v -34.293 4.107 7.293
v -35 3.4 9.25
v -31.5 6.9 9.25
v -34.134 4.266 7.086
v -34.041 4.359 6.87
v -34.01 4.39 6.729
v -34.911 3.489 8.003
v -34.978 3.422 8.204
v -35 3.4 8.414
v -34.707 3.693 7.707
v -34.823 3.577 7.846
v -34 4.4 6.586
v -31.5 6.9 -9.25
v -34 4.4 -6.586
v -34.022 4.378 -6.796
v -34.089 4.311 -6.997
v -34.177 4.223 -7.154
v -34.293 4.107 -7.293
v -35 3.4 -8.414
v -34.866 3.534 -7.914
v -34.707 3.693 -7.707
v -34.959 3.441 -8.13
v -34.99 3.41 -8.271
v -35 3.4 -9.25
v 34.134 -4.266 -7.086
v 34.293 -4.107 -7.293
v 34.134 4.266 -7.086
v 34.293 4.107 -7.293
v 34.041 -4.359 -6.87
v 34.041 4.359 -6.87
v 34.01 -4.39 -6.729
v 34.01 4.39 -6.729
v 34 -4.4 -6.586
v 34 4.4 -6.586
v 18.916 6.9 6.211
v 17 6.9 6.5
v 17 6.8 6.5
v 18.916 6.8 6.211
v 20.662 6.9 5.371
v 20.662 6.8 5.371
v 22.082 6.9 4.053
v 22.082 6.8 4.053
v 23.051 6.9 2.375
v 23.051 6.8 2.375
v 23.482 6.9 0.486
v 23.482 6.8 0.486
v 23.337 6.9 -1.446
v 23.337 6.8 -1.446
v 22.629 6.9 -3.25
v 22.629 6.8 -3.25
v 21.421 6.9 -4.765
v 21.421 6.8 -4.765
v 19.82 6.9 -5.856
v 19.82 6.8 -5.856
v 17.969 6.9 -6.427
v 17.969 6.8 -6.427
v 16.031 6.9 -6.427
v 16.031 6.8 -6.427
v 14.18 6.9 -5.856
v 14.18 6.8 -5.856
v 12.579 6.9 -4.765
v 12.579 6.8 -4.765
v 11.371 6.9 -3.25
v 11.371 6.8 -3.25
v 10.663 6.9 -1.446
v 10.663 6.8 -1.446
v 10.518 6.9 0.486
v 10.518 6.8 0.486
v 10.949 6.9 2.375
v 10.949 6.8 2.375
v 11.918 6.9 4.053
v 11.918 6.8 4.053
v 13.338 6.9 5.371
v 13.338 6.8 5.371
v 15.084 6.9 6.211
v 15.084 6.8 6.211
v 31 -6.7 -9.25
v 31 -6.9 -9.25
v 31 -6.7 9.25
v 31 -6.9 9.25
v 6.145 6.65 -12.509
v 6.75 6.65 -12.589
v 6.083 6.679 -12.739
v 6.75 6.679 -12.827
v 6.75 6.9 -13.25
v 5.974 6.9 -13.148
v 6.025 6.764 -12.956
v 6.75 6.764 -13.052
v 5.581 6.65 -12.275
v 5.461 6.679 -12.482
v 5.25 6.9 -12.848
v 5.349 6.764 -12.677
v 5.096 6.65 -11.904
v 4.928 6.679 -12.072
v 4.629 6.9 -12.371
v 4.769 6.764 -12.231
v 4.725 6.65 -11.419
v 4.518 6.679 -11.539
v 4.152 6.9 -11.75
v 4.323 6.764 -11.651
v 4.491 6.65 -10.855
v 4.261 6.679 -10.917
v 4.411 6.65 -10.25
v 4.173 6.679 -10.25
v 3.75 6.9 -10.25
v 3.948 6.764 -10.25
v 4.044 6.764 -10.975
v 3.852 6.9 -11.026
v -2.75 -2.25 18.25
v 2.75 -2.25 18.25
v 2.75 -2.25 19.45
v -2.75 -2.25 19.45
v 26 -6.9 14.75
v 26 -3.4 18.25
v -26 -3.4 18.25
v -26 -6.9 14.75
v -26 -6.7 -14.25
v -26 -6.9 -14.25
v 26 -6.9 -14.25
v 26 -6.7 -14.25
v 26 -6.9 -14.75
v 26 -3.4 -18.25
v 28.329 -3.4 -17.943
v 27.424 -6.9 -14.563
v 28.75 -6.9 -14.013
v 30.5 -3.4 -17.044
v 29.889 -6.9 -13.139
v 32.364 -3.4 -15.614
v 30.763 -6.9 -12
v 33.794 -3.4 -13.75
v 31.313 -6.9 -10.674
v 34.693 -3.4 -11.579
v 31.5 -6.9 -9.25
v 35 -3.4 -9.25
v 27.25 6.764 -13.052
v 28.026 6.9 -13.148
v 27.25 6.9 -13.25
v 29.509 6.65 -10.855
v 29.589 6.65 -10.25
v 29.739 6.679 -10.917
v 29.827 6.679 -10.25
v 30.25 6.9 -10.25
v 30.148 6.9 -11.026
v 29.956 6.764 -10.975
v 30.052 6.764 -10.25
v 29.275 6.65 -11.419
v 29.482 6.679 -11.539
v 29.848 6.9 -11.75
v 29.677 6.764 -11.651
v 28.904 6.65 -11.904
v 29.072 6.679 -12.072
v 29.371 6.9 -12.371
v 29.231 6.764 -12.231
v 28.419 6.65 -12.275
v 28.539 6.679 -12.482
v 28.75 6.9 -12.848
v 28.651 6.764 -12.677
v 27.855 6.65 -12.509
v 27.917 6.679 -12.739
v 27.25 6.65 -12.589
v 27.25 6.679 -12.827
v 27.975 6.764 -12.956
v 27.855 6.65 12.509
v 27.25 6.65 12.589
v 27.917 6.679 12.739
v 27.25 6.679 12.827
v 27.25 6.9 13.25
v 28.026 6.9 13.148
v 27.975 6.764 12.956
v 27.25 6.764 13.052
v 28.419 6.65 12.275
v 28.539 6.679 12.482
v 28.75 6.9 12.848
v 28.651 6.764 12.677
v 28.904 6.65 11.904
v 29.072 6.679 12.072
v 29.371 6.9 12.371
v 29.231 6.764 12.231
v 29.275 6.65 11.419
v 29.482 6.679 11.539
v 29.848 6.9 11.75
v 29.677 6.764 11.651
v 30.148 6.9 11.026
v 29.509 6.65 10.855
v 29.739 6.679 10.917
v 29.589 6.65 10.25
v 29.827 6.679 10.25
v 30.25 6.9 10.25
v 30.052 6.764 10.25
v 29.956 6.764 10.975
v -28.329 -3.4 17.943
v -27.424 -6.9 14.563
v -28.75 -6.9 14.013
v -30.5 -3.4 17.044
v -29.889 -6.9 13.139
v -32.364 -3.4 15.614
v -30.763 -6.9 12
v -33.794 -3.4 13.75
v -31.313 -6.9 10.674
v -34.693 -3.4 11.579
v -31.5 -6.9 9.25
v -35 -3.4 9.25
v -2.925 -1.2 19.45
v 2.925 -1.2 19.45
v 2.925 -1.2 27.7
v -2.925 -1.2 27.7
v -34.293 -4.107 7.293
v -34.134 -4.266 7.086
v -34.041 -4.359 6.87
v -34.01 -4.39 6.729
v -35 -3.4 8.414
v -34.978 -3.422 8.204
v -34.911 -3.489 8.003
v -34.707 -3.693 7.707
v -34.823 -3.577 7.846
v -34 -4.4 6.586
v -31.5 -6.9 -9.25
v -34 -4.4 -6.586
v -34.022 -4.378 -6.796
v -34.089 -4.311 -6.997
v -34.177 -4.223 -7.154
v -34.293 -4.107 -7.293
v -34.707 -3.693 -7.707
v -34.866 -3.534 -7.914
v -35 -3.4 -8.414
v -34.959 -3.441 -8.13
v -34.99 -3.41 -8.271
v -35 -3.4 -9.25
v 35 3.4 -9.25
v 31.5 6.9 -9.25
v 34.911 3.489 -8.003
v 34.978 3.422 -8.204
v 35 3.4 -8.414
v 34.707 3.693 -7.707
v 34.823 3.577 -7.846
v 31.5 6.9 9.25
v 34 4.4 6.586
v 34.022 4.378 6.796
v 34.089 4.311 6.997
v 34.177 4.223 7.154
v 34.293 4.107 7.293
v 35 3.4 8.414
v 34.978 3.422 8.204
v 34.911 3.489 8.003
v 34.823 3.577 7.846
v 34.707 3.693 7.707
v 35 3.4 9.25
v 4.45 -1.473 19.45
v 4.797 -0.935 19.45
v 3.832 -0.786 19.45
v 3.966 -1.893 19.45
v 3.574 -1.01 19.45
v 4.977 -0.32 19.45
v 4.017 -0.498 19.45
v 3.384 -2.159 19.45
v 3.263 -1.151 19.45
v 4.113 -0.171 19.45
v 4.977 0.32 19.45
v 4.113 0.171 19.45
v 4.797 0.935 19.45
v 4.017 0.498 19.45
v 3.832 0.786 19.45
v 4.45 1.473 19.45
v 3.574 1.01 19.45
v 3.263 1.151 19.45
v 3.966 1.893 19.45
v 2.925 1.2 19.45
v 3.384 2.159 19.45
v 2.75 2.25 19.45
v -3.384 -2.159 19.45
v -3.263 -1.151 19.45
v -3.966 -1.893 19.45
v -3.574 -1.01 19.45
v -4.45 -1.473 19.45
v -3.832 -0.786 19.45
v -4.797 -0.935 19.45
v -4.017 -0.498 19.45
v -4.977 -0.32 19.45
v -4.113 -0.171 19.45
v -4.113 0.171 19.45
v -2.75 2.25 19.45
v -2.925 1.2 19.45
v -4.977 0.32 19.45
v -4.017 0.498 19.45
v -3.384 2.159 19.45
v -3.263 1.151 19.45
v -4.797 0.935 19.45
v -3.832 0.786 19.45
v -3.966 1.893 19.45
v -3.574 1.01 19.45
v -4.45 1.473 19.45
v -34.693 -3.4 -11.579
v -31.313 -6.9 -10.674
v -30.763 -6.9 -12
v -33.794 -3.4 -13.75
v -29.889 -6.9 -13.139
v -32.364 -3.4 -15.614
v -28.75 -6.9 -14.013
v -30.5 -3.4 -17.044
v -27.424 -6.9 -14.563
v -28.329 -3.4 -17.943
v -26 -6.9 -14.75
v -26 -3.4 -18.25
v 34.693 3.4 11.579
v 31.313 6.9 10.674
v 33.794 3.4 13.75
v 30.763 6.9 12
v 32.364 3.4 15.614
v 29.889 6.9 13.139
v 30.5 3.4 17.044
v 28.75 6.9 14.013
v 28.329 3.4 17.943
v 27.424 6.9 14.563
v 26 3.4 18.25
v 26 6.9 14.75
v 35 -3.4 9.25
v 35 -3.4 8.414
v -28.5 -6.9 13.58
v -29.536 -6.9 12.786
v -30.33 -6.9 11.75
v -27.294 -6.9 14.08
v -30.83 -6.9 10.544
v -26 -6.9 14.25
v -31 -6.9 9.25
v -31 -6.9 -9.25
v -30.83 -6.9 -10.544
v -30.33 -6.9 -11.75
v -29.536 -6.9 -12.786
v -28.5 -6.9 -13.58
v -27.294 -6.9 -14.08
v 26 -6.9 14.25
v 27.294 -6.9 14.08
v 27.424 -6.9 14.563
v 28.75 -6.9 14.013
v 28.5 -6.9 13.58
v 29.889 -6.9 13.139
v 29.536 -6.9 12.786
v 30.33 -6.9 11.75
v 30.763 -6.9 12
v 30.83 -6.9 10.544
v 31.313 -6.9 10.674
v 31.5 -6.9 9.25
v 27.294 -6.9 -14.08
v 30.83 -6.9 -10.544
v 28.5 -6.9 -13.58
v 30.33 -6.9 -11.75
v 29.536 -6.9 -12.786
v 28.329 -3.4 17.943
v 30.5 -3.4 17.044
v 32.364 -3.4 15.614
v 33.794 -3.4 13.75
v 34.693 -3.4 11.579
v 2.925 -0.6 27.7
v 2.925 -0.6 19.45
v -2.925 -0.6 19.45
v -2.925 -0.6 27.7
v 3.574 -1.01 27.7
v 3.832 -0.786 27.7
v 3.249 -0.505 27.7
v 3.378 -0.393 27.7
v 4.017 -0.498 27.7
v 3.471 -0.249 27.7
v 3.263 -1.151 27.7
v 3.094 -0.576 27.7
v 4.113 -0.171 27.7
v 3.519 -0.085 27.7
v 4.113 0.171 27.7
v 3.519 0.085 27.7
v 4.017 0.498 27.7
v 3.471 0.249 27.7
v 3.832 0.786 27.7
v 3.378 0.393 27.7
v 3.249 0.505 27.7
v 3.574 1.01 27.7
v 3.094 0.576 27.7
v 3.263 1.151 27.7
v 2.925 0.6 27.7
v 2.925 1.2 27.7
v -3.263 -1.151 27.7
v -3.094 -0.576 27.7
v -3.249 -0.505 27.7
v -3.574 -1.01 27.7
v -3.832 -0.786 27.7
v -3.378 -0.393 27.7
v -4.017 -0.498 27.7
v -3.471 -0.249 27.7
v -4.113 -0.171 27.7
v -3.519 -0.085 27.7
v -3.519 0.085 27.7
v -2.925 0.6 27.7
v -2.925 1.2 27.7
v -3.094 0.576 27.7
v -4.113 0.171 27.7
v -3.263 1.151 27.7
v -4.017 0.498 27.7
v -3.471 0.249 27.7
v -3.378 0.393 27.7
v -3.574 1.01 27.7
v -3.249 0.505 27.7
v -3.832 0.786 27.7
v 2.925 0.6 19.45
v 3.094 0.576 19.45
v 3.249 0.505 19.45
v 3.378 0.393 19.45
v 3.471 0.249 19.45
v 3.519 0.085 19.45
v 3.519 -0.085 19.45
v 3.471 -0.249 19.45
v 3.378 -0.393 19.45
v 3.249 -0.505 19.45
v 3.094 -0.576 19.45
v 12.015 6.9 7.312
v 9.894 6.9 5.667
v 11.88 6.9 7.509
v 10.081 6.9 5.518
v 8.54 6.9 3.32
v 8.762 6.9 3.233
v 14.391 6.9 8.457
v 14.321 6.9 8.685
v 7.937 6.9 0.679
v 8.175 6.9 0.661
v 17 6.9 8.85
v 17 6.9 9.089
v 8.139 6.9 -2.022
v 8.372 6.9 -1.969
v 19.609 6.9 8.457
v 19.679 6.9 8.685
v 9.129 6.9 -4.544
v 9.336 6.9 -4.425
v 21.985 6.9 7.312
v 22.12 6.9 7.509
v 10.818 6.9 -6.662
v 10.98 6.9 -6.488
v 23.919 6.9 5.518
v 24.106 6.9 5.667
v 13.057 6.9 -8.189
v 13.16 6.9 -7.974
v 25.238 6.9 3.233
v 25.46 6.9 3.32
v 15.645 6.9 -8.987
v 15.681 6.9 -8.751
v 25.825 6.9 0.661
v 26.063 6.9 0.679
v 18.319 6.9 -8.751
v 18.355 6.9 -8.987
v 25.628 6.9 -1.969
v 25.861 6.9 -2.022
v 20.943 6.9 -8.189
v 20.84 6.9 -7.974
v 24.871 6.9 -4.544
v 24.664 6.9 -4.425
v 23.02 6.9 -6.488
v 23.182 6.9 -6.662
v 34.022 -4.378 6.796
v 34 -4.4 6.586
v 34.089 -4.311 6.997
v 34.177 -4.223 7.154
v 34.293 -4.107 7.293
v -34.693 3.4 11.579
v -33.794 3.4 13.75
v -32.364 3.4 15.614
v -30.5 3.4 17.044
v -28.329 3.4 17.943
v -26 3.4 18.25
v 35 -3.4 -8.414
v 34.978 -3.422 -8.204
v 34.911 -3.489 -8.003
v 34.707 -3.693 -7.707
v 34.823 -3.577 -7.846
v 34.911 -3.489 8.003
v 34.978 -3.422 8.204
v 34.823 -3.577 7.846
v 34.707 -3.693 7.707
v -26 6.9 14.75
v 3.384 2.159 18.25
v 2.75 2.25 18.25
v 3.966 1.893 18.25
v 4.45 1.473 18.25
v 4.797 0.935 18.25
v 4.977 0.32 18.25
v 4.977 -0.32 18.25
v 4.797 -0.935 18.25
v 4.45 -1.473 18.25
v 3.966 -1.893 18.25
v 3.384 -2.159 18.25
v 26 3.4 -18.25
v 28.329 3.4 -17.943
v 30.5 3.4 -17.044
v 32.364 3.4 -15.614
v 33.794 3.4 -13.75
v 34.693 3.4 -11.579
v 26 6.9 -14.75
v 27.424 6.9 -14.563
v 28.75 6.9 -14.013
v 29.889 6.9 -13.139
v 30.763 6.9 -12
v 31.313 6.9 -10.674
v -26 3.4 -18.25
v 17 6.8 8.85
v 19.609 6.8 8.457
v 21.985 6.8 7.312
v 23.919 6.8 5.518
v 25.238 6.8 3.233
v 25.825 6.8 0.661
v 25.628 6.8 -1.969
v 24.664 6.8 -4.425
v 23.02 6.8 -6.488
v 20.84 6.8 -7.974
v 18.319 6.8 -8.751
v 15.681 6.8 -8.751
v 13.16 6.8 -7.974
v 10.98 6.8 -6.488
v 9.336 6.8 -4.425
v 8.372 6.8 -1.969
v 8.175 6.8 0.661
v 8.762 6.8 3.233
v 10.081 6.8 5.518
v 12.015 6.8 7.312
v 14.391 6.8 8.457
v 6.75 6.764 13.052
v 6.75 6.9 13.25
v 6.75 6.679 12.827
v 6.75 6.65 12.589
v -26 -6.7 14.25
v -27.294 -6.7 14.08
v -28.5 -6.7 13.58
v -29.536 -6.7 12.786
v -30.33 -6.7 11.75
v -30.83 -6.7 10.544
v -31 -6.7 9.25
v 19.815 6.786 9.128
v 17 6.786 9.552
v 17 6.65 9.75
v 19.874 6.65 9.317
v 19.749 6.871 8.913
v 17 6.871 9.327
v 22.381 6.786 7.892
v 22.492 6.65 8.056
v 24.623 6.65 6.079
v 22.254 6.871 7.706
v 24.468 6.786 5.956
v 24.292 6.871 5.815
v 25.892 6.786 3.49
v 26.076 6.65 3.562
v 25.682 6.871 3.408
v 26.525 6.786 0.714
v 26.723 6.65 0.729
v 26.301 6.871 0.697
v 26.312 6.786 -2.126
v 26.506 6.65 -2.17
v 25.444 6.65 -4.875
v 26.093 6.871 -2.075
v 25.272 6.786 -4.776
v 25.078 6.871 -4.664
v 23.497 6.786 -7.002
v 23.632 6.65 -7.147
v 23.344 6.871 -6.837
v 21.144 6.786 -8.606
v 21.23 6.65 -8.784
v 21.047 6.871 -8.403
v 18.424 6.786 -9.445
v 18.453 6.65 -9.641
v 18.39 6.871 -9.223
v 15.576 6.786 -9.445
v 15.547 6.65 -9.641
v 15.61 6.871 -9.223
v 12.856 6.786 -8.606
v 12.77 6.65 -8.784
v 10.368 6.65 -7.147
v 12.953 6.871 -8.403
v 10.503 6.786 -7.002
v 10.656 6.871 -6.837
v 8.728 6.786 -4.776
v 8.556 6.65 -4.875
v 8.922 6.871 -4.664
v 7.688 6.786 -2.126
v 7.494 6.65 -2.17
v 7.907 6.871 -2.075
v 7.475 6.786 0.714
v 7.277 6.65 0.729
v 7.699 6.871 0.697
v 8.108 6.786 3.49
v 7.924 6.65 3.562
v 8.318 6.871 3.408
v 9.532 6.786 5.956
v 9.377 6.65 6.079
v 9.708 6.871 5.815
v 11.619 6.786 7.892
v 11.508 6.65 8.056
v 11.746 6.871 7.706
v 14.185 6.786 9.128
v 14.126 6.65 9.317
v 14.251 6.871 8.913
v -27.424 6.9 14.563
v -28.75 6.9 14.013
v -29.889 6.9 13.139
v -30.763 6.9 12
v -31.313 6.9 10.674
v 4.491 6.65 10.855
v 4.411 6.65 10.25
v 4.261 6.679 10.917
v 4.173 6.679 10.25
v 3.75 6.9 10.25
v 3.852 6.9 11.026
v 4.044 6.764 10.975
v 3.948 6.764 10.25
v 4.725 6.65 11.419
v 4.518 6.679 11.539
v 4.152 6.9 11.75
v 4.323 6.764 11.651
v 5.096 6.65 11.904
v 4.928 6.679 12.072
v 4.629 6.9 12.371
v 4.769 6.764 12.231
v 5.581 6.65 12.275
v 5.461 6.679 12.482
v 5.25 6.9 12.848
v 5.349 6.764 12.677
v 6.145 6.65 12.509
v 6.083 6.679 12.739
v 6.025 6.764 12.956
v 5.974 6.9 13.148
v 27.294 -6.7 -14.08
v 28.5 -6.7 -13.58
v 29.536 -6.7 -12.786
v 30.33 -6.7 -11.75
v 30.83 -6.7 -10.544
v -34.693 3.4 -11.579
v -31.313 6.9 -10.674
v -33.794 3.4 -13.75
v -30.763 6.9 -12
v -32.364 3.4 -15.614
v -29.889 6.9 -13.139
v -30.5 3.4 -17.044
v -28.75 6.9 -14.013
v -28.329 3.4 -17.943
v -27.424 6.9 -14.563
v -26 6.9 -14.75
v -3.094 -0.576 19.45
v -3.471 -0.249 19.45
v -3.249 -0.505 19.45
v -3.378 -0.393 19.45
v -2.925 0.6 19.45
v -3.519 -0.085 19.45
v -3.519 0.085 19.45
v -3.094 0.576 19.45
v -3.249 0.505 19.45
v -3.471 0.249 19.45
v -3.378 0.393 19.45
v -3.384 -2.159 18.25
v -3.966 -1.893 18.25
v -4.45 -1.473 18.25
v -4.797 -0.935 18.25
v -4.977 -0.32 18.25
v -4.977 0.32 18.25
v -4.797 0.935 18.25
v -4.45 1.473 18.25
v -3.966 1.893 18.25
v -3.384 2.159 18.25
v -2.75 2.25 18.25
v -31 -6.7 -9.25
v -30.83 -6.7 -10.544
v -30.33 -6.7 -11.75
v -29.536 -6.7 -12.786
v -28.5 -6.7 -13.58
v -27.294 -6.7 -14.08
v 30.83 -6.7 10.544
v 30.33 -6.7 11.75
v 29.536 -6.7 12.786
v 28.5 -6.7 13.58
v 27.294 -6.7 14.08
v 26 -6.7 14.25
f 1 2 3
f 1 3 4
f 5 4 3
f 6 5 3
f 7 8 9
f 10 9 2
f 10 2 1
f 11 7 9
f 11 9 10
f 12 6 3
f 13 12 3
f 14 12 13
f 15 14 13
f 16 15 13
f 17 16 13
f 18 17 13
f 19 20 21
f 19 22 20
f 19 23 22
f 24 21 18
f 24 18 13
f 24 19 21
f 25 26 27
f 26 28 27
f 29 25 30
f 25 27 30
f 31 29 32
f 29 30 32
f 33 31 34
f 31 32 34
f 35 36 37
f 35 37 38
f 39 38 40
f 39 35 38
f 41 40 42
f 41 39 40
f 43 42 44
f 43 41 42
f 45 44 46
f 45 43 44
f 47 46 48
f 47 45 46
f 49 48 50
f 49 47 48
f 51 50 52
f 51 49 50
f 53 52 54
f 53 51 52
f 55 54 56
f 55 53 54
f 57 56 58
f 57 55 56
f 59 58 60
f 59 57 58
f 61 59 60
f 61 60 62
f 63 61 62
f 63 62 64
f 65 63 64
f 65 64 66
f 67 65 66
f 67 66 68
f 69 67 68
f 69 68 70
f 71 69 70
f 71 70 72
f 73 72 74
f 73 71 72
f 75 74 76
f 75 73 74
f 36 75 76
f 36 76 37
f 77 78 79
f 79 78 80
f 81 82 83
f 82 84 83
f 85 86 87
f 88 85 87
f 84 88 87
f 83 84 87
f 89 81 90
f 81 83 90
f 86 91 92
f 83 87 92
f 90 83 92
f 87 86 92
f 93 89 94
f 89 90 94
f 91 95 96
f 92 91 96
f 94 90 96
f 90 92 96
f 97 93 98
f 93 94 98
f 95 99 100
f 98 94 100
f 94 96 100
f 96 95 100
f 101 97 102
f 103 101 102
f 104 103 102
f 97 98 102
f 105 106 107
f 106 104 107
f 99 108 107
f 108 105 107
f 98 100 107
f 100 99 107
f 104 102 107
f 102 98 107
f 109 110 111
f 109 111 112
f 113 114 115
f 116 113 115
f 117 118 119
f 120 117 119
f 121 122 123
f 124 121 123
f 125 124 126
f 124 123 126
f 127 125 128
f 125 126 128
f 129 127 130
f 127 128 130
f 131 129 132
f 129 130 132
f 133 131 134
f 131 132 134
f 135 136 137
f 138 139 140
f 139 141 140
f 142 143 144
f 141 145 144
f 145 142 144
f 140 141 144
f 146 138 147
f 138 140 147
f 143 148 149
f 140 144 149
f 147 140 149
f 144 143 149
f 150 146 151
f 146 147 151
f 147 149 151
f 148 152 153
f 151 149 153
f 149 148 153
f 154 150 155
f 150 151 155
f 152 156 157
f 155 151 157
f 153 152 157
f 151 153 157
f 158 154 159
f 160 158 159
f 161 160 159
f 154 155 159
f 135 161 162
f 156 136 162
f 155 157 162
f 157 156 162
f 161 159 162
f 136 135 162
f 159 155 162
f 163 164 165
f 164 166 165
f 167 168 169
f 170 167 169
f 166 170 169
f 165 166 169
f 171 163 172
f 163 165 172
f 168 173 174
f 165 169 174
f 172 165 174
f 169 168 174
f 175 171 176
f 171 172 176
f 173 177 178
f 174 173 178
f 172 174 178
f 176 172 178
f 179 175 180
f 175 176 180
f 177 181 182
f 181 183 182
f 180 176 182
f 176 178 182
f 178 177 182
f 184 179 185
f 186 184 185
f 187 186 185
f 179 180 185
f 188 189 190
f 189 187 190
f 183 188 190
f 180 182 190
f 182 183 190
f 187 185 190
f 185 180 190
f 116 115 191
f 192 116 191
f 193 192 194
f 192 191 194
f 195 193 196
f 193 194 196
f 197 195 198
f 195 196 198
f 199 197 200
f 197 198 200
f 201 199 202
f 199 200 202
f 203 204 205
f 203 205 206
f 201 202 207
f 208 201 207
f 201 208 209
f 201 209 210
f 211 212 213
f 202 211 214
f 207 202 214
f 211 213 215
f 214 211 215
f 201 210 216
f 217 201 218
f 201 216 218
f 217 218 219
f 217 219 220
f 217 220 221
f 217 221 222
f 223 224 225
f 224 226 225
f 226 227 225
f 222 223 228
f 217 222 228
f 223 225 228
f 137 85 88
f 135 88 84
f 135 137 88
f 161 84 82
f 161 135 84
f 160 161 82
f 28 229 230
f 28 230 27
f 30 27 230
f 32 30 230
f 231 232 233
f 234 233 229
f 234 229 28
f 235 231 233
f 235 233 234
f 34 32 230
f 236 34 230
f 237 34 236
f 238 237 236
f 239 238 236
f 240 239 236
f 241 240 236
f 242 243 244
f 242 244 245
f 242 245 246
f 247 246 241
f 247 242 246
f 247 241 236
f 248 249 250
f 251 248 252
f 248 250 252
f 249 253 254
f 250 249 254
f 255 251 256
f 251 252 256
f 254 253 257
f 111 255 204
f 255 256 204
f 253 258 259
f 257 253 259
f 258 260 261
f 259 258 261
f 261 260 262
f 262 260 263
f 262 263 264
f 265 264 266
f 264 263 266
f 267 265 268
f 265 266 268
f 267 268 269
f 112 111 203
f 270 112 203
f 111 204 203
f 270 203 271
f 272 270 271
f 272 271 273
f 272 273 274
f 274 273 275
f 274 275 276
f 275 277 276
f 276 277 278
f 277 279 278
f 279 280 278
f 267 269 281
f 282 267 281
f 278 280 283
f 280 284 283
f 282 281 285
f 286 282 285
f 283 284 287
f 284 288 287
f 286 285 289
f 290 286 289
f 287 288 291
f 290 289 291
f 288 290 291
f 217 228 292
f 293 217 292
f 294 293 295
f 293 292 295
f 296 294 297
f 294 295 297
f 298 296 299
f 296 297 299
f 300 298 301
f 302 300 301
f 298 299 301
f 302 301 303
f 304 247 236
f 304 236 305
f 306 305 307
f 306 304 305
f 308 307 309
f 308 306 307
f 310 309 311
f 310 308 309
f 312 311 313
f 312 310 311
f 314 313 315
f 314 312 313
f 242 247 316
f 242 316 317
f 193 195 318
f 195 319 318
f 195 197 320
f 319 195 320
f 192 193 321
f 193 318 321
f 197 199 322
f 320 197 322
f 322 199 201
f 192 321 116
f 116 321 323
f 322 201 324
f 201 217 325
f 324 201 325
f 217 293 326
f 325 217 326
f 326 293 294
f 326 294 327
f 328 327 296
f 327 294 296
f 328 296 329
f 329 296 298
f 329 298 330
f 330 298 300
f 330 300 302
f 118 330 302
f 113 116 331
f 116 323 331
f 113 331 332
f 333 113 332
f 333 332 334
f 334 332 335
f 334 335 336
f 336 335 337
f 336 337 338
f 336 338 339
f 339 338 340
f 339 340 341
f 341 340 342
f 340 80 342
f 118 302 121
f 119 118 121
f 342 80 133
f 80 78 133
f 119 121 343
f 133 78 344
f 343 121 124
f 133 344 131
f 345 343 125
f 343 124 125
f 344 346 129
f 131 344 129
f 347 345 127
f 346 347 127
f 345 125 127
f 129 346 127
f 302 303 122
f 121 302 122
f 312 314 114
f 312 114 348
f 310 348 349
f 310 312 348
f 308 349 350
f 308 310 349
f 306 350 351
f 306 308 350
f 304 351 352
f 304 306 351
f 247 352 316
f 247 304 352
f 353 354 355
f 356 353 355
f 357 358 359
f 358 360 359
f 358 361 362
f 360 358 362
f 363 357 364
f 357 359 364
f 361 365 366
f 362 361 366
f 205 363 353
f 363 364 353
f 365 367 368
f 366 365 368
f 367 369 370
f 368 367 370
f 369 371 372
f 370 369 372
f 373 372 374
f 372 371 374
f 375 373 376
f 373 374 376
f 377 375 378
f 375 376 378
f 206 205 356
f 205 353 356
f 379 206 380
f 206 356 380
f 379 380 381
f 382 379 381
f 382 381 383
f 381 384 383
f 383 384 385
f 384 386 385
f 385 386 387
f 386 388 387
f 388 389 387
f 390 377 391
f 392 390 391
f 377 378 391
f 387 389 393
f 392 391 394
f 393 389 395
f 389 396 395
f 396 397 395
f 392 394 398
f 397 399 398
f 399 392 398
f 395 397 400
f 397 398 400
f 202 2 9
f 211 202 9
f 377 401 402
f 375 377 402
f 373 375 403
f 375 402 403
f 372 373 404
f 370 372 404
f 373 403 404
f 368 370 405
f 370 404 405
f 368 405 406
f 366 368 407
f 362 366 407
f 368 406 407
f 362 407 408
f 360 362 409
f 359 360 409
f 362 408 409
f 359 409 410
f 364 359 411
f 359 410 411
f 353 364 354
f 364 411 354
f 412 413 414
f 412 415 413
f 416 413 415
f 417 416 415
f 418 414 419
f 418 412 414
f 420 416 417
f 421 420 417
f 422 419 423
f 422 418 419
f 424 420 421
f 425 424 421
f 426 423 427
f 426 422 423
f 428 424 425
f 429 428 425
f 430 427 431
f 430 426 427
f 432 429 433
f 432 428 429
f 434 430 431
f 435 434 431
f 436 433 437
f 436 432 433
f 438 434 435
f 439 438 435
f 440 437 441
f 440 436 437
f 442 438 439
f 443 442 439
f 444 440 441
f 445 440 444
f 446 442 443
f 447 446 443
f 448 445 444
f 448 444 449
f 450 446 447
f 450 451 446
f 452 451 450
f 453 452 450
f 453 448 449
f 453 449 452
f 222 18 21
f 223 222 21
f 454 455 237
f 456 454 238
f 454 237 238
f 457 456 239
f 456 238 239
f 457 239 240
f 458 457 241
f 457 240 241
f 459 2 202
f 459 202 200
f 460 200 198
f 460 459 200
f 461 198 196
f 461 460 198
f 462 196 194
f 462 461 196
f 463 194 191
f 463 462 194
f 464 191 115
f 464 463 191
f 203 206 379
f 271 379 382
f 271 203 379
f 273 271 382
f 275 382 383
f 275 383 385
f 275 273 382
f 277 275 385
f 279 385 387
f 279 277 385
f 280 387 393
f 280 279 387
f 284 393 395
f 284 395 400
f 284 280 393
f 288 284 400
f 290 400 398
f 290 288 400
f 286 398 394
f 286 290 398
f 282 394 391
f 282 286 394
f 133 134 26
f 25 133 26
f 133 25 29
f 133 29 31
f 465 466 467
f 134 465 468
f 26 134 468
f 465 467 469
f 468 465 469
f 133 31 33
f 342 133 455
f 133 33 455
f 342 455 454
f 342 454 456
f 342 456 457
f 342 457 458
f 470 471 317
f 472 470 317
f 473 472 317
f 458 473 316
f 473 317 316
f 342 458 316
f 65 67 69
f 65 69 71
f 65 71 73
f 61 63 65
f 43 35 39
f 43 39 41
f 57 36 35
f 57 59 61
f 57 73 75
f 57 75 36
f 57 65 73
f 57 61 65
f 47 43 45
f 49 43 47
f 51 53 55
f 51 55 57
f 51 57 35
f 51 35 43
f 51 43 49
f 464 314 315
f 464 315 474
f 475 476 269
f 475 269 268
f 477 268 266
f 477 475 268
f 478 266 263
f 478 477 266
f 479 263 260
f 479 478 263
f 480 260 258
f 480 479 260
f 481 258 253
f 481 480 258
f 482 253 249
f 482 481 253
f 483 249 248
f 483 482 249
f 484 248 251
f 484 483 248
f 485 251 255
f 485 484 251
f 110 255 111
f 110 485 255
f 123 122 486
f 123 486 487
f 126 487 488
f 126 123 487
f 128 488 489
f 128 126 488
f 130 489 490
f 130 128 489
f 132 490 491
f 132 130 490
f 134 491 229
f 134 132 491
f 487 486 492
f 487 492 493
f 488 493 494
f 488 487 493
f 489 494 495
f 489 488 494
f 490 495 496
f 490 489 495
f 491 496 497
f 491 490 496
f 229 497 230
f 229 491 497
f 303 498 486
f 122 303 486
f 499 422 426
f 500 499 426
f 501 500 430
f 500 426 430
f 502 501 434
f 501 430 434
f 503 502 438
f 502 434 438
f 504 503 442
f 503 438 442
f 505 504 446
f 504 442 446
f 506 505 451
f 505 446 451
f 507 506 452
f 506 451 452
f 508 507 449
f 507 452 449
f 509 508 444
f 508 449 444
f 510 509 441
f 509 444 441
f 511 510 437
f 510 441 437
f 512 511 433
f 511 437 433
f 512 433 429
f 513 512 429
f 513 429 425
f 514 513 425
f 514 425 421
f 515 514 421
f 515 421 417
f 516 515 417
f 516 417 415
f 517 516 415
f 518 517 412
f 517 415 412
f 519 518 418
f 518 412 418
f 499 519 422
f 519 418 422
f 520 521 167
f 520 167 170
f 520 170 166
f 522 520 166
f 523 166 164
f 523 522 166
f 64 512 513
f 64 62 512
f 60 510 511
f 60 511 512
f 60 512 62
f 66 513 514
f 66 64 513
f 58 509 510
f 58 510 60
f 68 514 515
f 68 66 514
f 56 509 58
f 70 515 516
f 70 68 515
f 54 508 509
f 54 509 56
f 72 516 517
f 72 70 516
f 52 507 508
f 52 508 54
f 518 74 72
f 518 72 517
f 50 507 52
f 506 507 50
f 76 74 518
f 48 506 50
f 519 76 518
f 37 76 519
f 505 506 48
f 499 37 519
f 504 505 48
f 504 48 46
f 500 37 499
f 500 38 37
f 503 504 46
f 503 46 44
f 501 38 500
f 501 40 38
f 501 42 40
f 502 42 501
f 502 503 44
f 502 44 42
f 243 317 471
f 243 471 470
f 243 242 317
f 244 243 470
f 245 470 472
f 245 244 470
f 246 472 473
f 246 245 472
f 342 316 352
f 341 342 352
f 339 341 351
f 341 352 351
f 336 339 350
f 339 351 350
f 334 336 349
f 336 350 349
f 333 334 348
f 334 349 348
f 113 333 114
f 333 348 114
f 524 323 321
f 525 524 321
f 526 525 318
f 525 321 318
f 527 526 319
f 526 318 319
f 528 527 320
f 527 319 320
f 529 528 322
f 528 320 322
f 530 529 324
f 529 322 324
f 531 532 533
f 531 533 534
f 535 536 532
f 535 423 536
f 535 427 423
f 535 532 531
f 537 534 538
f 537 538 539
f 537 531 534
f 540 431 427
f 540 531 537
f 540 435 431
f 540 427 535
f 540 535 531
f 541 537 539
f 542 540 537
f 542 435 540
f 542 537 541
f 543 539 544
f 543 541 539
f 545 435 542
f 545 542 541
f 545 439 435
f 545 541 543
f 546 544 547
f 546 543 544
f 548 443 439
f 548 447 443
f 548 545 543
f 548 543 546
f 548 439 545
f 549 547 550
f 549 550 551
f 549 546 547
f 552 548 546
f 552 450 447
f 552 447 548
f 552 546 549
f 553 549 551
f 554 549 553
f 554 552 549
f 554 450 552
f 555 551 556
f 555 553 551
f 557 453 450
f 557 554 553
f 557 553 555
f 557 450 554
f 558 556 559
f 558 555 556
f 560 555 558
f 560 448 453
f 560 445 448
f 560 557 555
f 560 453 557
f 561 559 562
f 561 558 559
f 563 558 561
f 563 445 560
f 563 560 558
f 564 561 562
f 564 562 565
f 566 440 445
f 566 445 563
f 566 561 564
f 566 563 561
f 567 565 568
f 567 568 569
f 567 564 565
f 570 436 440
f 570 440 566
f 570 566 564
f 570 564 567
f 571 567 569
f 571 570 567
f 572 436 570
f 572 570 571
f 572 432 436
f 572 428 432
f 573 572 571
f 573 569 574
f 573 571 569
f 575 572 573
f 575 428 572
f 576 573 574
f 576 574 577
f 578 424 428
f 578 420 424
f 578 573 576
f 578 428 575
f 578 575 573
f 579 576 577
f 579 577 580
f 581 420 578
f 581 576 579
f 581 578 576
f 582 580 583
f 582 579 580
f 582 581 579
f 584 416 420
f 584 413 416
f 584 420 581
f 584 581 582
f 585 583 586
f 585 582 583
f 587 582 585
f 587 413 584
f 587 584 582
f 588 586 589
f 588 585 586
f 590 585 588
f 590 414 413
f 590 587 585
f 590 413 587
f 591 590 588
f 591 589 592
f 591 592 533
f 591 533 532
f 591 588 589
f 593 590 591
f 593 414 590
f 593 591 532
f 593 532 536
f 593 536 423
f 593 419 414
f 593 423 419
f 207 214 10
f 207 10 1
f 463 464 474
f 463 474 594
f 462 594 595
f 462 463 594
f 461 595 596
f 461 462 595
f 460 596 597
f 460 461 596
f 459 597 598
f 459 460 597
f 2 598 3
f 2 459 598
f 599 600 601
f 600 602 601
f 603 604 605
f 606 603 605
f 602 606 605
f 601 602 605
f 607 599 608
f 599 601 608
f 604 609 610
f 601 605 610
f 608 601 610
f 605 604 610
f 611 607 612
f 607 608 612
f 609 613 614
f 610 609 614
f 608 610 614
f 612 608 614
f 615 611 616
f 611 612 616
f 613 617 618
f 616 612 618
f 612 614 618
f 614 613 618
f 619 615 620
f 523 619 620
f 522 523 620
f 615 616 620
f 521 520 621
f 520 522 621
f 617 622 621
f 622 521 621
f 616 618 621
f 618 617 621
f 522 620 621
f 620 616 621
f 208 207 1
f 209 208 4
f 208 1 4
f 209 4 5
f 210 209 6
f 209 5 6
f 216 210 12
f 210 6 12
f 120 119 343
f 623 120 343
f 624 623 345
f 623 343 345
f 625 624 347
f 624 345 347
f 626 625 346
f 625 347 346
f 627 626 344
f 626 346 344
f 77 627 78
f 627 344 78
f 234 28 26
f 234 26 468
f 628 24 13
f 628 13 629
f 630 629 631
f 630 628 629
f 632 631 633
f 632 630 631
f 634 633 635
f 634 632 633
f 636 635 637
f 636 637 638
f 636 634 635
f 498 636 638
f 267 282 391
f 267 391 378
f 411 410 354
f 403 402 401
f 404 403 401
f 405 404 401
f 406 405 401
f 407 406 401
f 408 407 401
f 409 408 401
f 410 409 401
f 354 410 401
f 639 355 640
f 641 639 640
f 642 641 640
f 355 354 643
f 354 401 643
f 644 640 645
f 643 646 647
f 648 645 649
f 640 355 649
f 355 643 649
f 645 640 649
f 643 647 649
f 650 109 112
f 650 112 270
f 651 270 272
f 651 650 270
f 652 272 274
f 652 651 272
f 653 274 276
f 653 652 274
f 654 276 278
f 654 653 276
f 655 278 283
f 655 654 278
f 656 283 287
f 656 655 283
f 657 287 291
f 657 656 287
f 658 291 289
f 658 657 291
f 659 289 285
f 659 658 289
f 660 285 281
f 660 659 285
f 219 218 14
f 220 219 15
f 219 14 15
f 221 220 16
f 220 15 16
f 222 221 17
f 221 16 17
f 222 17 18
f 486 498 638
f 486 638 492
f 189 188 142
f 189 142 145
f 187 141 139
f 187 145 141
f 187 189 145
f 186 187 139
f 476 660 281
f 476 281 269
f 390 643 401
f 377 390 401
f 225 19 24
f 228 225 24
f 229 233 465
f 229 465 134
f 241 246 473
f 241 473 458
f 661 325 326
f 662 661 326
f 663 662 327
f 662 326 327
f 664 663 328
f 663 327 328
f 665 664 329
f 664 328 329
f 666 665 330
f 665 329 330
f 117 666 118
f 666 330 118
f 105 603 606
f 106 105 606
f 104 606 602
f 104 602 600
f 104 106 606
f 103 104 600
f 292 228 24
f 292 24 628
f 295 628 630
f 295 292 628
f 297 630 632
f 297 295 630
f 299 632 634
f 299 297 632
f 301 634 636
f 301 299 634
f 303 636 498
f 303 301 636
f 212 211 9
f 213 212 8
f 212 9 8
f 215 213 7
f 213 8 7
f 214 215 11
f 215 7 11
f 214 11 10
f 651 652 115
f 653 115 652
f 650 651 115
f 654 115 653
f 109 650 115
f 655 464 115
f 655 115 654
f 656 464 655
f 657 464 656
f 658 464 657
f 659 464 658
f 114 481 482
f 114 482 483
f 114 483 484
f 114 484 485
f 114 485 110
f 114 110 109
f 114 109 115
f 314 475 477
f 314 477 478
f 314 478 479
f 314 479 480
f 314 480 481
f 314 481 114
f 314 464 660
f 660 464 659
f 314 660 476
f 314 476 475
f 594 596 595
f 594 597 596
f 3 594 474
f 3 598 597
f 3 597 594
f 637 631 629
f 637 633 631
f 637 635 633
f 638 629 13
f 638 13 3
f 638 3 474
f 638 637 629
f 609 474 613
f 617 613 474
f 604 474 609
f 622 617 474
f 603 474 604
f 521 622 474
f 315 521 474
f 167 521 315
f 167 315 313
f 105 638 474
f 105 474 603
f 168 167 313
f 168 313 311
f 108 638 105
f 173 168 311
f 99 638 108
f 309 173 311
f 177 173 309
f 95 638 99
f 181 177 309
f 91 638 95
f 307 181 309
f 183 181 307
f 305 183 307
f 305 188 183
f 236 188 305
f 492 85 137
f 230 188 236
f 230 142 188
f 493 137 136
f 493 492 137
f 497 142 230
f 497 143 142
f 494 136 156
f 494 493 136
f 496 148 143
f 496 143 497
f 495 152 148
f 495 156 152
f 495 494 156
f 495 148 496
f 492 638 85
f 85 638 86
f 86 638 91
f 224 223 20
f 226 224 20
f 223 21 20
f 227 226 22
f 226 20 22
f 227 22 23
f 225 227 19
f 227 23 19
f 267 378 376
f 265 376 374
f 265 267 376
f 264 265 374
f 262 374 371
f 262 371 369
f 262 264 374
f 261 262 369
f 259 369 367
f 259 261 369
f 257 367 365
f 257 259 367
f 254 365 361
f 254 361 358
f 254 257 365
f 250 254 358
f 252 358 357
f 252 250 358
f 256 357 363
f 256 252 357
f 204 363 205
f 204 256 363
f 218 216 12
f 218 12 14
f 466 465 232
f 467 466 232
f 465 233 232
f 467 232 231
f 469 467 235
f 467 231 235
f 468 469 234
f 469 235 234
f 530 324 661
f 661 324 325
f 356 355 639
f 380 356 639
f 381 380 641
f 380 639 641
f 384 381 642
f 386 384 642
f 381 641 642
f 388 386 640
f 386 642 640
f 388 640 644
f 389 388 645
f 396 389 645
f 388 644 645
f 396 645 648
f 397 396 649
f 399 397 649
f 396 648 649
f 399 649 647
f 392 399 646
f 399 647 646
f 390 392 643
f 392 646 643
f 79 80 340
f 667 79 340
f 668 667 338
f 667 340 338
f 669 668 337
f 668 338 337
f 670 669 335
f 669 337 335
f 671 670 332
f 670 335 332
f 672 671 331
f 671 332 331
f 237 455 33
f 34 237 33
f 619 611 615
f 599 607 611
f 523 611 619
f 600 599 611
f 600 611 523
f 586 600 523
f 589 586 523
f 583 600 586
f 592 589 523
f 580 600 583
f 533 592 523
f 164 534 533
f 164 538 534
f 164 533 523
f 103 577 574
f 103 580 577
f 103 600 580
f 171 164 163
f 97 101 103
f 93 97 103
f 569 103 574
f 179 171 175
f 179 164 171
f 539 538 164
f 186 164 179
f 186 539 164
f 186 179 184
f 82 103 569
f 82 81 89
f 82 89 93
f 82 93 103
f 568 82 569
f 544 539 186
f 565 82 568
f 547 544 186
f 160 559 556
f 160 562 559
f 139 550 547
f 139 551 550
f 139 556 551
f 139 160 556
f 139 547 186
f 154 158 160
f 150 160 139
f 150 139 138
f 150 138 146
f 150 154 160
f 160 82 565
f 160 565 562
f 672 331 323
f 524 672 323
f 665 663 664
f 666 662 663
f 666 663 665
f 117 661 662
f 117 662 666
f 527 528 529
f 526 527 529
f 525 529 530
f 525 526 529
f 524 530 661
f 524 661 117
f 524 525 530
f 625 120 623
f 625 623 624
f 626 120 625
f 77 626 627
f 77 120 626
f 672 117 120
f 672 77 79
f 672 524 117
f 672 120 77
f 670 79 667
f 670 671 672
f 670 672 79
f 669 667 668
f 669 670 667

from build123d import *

# Parameters (mm, degrees)
SKETCH1_W               = 70
SKETCH1_H               = 36.5
BOSS_EXTRUDE1_DEPTH     = 6.9
BOSS_EXTRUDE2_DEPTH     = 1.2
BOSS_EXTRUDE3_DEPTH     = 8.25
FILLET1_R               = 9
SKETCH4_R               = 9.75
CUT_EXTRUDE1_DEPTH      = 0.25
SKETCH5_R               = 8.85
SKETCH5_R_2             = 6.5
CUT_EXTRUDE2_DEPTH      = 0.1
CHAMFER1_SIZE           = 3.5
CUT_EXTRUDE3_DEPTH      = 0.2
CUT_EXTRUDE4_DEPTH      = 46.16525213
CUT_EXTRUDE4_DEPTH_BACK = 46.16525213
FILLET2_R               = 1
FILLET3_R               = 1


with BuildPart() as part:
    # Sketch1 → Boss-Extrude1 (new, symmetric)
    with BuildSketch(Plane(origin=(0, 0, 0), x_dir=(1, 0, 0), z_dir=(0, 1, 0))):
        Rectangle(SKETCH1_W, SKETCH1_H)
    extrude(amount=BOSS_EXTRUDE1_DEPTH, both=True)

    # Sketch2 → Boss-Extrude2 (add)
    with BuildSketch(Plane.XY.offset(18.25)):
        with BuildLine():
            Line((2.75, -2.25), (-2.75, -2.25))
            ThreePointArc((-2.75, -2.25), (-5, 0), (-2.75, 2.25))
            Line((-2.75, 2.25), (2.75, 2.25))
            ThreePointArc((2.75, 2.25), (5, 0), (2.75, -2.25))
        make_face()
    extrude(amount=BOSS_EXTRUDE2_DEPTH)

    # Sketch3 → Boss-Extrude3 (add)
    with BuildSketch(Plane.XY.offset(19.45)):
        with BuildLine():
            Line((2.925, -1.2), (-2.925, -1.2))
            ThreePointArc((-2.925, -1.2), (-4.125, 0), (-2.925, 1.2))
            Line((-2.925, 1.2), (2.925, 1.2))
            ThreePointArc((2.925, 1.2), (4.125, 0), (2.925, -1.2))
        make_face()
        with BuildLine():
            Line((2.925, -0.6), (-2.925, -0.6))
            ThreePointArc((-2.925, -0.6), (-3.525, 0), (-2.925, 0.6))
            Line((-2.925, 0.6), (2.925, 0.6))
            ThreePointArc((2.925, 0.6), (3.525, 0), (2.925, -0.6))
        make_face(mode=Mode.SUBTRACT)
    extrude(amount=BOSS_EXTRUDE3_DEPTH)

    # Fillet1
    fillet1_edges = [part.edges().sort_by_distance(p)[0] for p in [
        (35, 0, 18.25),
        (-35, 0, 18.25),
        (-35, 0, -18.25),
        (35, 0, -18.25),
    ]]
    fillet(fillet1_edges, radius=FILLET1_R)

    # Sketch4 → Cut-Extrude1 (cut)
    with BuildSketch(Plane(origin=(0, 6.9, 0), x_dir=(1, 0, 0), z_dir=(0, 1, 0))):
        with BuildLine():
            Line((27.25, 13.25), (6.75, 13.25))
            ThreePointArc((6.75, 13.25), (4.628679656, 12.371320344), (3.75, 10.25))
            Line((3.75, 10.25), (3.75, -10.25))
            ThreePointArc((3.75, -10.25), (4.628679656, -12.371320344), (6.75, -13.25))
            Line((6.75, -13.25), (27.25, -13.25))
            ThreePointArc((27.25, -13.25), (29.371320344, -12.371320344), (30.25, -10.25))
            Line((30.25, -10.25), (30.25, 10.25))
            ThreePointArc((30.25, 10.25), (29.371320344, 12.371320344), (27.25, 13.25))
        make_face()
        with Locations(Location((17, 0, 0), (0, 0, 270))):
            Circle(SKETCH4_R, mode=Mode.SUBTRACT)
    extrude(amount=-CUT_EXTRUDE1_DEPTH, mode=Mode.SUBTRACT)

    # Sketch5 → Cut-Extrude2 (cut)
    with BuildSketch(Plane(origin=(0, 6.9, 0), x_dir=(1, 0, 0), z_dir=(0, 1, 0))):
        with Locations(Location((17, 0, 0), (0, 0, 270))):
            Circle(SKETCH5_R)
        with Locations(Location((17, 0, 0), (0, 0, 270))):
            Circle(SKETCH5_R_2, mode=Mode.SUBTRACT)
    extrude(amount=-CUT_EXTRUDE2_DEPTH, mode=Mode.SUBTRACT)

    # Chamfer1
    chamfer1_edges = [part.edges().sort_by_distance(p)[0] for p in [
        (0, -6.9, -18.25),
        (0, 6.9, -18.25),
        (35, -6.9, 0),
        (0, -6.9, 18.25),
        (-35, -6.9, 0),
        (-32.363961031, -6.9, 15.613961031),
        (-32.363961031, -6.9, -15.613961031),
        (32.363961031, -6.9, 15.613961031),
        (32.363961031, -6.9, -15.613961031),
        (35, 6.9, 0),
        (-35, 6.9, 0),
        (0, 6.9, 18.25),
        (-32.363961031, 6.9, 15.613961031),
        (-32.363961031, 6.9, -15.613961031),
        (32.363961031, 6.9, 15.613961031),
        (32.363961031, 6.9, -15.613961031),
    ]]
    chamfer(chamfer1_edges, length=CHAMFER1_SIZE)

    # Sketch6 → Cut-Extrude3 (cut)
    with BuildSketch(Plane.XZ.offset(6.9)):
        with BuildLine():
            Line((-26, -14.25), (26, -14.25))
            ThreePointArc((26, -14.25), (29.535533906, -12.785533906), (31, -9.25))
            Line((31, -9.25), (31, 9.25))
            ThreePointArc((31, 9.25), (29.535533906, 12.785533906), (26, 14.25))
            Line((26, 14.25), (-26, 14.25))
            ThreePointArc((-26, 14.25), (-29.535533906, 12.785533906), (-31, 9.25))
            Line((-31, 9.25), (-31, -9.25))
            ThreePointArc((-31, -9.25), (-29.535533906, -12.785533906), (-26, -14.25))
        make_face()
    extrude(amount=-CUT_EXTRUDE3_DEPTH, mode=Mode.SUBTRACT)

    # Sketch7 → Cut-Extrude4 (cut, two sides: drawn at the far end of the back side and taken through both)
    with BuildSketch(Plane(origin=(0, 0, 0), x_dir=(1, 0, 0), z_dir=(0, 1, 0)).offset(-CUT_EXTRUDE4_DEPTH_BACK)):
        Polygon((-34, -7), (-34, 7), (-35, 8), (-35, -8), align=None)
        Polygon((34, 7), (35, 8), (35, -8), (34, -7), align=None)
    extrude(amount=CUT_EXTRUDE4_DEPTH + CUT_EXTRUDE4_DEPTH_BACK, mode=Mode.SUBTRACT)

    # Fillet2
    fillet2_edges = [part.edges().sort_by_distance(p)[0] for p in [
        (34, 0, 7),
        (34, 0, -7),
        (35, 0, -8),
        (35, 0, 8),
        (-35, 0, -8),
        (-34, 0, -7),
        (-34, 0, 7),
        (-35, 0, 8),
    ]]
    fillet(fillet2_edges, radius=FILLET2_R)

    # Fillet3
    # the kernel refuses this fillet: 1 mm, written as the material it adds along each edge
    with BuildSketch(Plane(origin=(27.25, 6.65, -10.25), x_dir=(1, 0, 0), z_dir=(0, 0, 1))) as fillet3_piece_1:
        with BuildLine():
            CenterArc((2.338562172, 1), FILLET3_R, 270, 41.409622109)
            Line((2.338562172, 0), (2.338562172, -0.02))
            Line((2.338562172, -0.02), (3, -0.02))
            Line((3, -0.02), (3.02, 0))
            ThreePointArc((3.02, 0), (3.02, 0.125), (3.013228757, 0.235))
            Line((3.013228757, 0.235), (3, 0.25))
        make_face()
    revolve(axis=Axis((27.25, 6.65, -10.25), (0, 1, 0)), revolution_arc=90)
    with BuildSketch(Plane(origin=(30.25, 6.65, 10.25), x_dir=(0, 1, 0), z_dir=(0, 0, -1)), Plane(origin=(6.75, 6.65, 13.25), x_dir=(0, 1, 0), z_dir=(1, 0, 0)), Plane(origin=(3.75, 6.65, -10.25), x_dir=(0, 1, 0), z_dir=(0, 0, 1)), Plane(origin=(27.25, 6.65, -13.25), x_dir=(0, 1, 0), z_dir=(-1, 0, 0))) as fillet3_piece_2:
        with BuildLine():
            CenterArc((1, -0.661437828), FILLET3_R, 138.590377891, 41.409622109)
            Line((0, -0.661437828), (-0.02, -0.661437828))
            Line((-0.02, -0.661437828), (-0.02, 0))
            Line((-0.02, 0), (0, 0.02))
            ThreePointArc((0, 0.02), (0.125, 0.02), (0.235, 0.013228757))
            Line((0.235, 0.013228757), (0.25, 0))
        make_face()
    extrude(amount=20.5)
    with BuildSketch(Plane(origin=(27.25, 6.65, 10.25), x_dir=(0, 0, 1), z_dir=(-1, 0, 0))) as fillet3_piece_3:
        with BuildLine():
            CenterArc((2.338562172, 1), FILLET3_R, 270, 41.409622109)
            Line((2.338562172, 0), (2.338562172, -0.02))
            Line((2.338562172, -0.02), (3, -0.02))
            Line((3, -0.02), (3.02, 0))
            ThreePointArc((3.02, 0), (3.02, 0.125), (3.013228757, 0.235))
            Line((3.013228757, 0.235), (3, 0.25))
        make_face()
    revolve(axis=Axis((27.25, 6.65, 10.25), (0, 1, 0)), revolution_arc=90)
    with BuildSketch(Plane(origin=(6.75, 6.65, 10.25), x_dir=(-1, 0, 0), z_dir=(0, 0, -1))) as fillet3_piece_4:
        with BuildLine():
            CenterArc((2.338562172, 1), FILLET3_R, 270, 41.409622109)
            Line((2.338562172, 0), (2.338562172, -0.02))
            Line((2.338562172, -0.02), (3, -0.02))
            Line((3, -0.02), (3.02, 0))
            ThreePointArc((3.02, 0), (3.02, 0.125), (3.013228757, 0.235))
            Line((3.013228757, 0.235), (3, 0.25))
        make_face()
    revolve(axis=Axis((6.75, 6.65, 10.25), (0, 1, 0)), revolution_arc=90)
    with BuildSketch(Plane(origin=(6.75, 6.65, -10.25), x_dir=(0, 0, -1), z_dir=(1, 0, 0))) as fillet3_piece_5:
        with BuildLine():
            CenterArc((2.338562172, 1), FILLET3_R, 270, 41.409622109)
            Line((2.338562172, 0), (2.338562172, -0.02))
            Line((2.338562172, -0.02), (3, -0.02))
            Line((3, -0.02), (3.02, 0))
            ThreePointArc((3.02, 0), (3.02, 0.125), (3.013228757, 0.235))
            Line((3.013228757, 0.235), (3, 0.25))
        make_face()
    revolve(axis=Axis((6.75, 6.65, -10.25), (0, 1, 0)), revolution_arc=90)
    # the kernel refuses this fillet: 1 mm, written as the material it takes off along each edge
    with BuildSketch(Plane(origin=(17, 6.9, 0), x_dir=(0, 0, 1), z_dir=(-1, 0, 0))) as fillet3_2_piece_1:
        with BuildLine():
            CenterArc((9.088562172, -1), FILLET3_R, 48.590377891, 41.409622109)
            Line((9.088562172, 0), (9.088562172, 0.02))
            Line((9.088562172, 0.02), (9.75, 0.02))
            Line((9.75, 0.02), (9.77, 0))
            ThreePointArc((9.77, 0), (9.77, -0.125), (9.763228757, -0.235))
            Line((9.763228757, -0.235), (9.75, -0.25))
        make_face()
    revolve(axis=Axis((17, 6.9, 0), (0, 1, 0)), mode=Mode.SUBTRACT)


solid = part.part
